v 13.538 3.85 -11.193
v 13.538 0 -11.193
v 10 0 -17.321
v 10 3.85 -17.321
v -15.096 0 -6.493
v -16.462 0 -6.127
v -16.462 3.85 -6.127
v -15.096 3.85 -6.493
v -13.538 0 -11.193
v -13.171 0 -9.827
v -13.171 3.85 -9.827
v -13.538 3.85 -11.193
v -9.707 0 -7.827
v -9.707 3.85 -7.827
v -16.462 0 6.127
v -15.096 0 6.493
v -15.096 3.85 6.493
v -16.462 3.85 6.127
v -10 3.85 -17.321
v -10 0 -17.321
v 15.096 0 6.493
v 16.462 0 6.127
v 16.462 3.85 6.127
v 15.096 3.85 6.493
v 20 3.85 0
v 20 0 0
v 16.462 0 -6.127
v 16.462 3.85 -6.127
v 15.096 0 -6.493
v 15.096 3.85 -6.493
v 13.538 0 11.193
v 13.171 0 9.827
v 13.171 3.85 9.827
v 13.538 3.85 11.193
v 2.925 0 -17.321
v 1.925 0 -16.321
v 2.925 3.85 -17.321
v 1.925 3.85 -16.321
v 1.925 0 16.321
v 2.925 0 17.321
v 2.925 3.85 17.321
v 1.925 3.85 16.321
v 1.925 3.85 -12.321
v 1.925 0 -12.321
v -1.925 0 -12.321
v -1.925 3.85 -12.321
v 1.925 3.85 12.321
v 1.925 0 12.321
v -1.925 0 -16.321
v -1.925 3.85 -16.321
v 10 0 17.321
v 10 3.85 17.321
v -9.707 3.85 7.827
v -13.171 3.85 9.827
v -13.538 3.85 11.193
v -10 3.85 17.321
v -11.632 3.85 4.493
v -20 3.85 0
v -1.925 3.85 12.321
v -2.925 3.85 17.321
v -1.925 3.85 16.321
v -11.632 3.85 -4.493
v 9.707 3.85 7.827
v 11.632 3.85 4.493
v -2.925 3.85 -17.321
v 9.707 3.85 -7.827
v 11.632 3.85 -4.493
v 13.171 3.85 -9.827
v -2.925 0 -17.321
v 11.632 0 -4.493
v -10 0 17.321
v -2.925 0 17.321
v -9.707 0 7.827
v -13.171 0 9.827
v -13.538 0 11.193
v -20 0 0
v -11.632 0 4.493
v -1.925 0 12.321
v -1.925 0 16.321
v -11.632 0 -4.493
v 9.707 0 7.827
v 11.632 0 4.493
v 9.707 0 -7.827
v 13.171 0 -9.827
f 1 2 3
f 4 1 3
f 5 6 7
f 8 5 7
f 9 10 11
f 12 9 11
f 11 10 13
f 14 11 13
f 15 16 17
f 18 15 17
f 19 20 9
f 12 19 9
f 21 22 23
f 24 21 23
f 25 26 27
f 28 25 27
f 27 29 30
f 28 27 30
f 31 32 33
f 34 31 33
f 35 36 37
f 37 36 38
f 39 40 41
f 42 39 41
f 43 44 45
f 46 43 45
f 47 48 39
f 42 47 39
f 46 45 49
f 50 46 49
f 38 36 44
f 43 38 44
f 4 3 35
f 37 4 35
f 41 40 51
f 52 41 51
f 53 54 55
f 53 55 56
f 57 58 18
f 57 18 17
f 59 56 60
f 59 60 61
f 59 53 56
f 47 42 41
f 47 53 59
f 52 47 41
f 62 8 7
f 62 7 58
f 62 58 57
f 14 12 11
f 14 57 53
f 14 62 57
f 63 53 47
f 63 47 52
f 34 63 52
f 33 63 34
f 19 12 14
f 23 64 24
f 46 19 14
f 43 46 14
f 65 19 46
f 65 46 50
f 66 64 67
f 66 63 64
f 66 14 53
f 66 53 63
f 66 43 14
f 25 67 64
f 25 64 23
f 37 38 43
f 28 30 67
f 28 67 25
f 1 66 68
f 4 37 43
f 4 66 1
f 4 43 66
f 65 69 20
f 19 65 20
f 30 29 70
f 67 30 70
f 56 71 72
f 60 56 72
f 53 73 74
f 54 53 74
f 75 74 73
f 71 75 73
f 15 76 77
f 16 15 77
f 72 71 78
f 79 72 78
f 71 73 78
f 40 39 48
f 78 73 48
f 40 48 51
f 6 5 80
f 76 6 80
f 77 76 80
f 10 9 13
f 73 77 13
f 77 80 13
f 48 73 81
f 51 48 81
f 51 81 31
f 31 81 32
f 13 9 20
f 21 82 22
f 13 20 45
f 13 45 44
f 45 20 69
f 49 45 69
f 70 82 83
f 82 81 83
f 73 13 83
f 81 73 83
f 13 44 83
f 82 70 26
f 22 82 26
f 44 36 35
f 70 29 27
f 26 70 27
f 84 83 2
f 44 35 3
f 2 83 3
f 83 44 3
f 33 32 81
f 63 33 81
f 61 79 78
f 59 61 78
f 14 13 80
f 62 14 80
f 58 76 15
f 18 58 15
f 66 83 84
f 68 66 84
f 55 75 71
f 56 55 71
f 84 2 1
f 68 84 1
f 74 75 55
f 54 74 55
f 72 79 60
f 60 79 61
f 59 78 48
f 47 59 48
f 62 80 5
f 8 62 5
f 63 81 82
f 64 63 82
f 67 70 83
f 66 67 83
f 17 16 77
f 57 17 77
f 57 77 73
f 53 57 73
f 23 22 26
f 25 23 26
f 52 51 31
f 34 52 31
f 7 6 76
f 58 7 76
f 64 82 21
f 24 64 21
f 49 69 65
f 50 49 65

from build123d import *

# Parameters (mm, degrees)
BOSS_EXTRUDE1_DEPTH = 3.85
CHAMFER1_SIZE       = 1


with BuildPart() as part:
    # Sketch1 → Boss-Extrude1 (new body)
    with BuildSketch(Plane(origin=(0, 0, 0), x_dir=(1, 0, 0), z_dir=(0, 1, 0))):
        Polygon((20, 0), (15.9625, 6.993155136), (11.632372981, 4.493155136), (9.707372981, 7.82735294), (14.0375, 10.32735294), (10, 17.320508076), (1.925, 17.320508076), (1.925, 12.320508076), (-1.925, 12.320508076), (-1.925, 17.320508076), (-10, 17.320508076), (-14.0375, 10.32735294), (-9.707372981, 7.82735294), (-11.632372981, 4.493155136), (-15.9625, 6.993155136), (-20, 0), (-15.9625, -6.993155136), (-11.632372981, -4.493155136), (-9.707372981, -7.82735294), (-14.0375, -10.32735294), (-10, -17.320508076), (-1.925, -17.320508076), (-1.925, -12.320508076), (1.925, -12.320508076), (1.925, -17.320508076), (10, -17.320508076), (14.0375, -10.32735294), (9.707372981, -7.82735294), (11.632372981, -4.493155136), (15.9625, -6.993155136), align=None)
    extrude(amount=BOSS_EXTRUDE1_DEPTH)

    # Chamfer1
    chamfer1_edges = [part.edges().sort_by_distance(p)[0] for p in [
        (15.9625, 1.925, 6.993155136),
        (15.9625, 1.925, -6.993155136),
        (14.0375, 1.925, -10.32735294),
        (1.925, 1.925, -17.320508076),
        (-1.925, 1.925, -17.320508076),
        (-14.0375, 1.925, -10.32735294),
        (-15.9625, 1.925, -6.993155136),
        (-15.9625, 1.925, 6.993155136),
        (-14.0375, 1.925, 10.32735294),
        (-1.925, 1.925, 17.320508076),
        (1.925, 1.925, 17.320508076),
        (14.0375, 1.925, 10.32735294),
    ]]
    chamfer(chamfer1_edges, length=CHAMFER1_SIZE)


solid = part.part
